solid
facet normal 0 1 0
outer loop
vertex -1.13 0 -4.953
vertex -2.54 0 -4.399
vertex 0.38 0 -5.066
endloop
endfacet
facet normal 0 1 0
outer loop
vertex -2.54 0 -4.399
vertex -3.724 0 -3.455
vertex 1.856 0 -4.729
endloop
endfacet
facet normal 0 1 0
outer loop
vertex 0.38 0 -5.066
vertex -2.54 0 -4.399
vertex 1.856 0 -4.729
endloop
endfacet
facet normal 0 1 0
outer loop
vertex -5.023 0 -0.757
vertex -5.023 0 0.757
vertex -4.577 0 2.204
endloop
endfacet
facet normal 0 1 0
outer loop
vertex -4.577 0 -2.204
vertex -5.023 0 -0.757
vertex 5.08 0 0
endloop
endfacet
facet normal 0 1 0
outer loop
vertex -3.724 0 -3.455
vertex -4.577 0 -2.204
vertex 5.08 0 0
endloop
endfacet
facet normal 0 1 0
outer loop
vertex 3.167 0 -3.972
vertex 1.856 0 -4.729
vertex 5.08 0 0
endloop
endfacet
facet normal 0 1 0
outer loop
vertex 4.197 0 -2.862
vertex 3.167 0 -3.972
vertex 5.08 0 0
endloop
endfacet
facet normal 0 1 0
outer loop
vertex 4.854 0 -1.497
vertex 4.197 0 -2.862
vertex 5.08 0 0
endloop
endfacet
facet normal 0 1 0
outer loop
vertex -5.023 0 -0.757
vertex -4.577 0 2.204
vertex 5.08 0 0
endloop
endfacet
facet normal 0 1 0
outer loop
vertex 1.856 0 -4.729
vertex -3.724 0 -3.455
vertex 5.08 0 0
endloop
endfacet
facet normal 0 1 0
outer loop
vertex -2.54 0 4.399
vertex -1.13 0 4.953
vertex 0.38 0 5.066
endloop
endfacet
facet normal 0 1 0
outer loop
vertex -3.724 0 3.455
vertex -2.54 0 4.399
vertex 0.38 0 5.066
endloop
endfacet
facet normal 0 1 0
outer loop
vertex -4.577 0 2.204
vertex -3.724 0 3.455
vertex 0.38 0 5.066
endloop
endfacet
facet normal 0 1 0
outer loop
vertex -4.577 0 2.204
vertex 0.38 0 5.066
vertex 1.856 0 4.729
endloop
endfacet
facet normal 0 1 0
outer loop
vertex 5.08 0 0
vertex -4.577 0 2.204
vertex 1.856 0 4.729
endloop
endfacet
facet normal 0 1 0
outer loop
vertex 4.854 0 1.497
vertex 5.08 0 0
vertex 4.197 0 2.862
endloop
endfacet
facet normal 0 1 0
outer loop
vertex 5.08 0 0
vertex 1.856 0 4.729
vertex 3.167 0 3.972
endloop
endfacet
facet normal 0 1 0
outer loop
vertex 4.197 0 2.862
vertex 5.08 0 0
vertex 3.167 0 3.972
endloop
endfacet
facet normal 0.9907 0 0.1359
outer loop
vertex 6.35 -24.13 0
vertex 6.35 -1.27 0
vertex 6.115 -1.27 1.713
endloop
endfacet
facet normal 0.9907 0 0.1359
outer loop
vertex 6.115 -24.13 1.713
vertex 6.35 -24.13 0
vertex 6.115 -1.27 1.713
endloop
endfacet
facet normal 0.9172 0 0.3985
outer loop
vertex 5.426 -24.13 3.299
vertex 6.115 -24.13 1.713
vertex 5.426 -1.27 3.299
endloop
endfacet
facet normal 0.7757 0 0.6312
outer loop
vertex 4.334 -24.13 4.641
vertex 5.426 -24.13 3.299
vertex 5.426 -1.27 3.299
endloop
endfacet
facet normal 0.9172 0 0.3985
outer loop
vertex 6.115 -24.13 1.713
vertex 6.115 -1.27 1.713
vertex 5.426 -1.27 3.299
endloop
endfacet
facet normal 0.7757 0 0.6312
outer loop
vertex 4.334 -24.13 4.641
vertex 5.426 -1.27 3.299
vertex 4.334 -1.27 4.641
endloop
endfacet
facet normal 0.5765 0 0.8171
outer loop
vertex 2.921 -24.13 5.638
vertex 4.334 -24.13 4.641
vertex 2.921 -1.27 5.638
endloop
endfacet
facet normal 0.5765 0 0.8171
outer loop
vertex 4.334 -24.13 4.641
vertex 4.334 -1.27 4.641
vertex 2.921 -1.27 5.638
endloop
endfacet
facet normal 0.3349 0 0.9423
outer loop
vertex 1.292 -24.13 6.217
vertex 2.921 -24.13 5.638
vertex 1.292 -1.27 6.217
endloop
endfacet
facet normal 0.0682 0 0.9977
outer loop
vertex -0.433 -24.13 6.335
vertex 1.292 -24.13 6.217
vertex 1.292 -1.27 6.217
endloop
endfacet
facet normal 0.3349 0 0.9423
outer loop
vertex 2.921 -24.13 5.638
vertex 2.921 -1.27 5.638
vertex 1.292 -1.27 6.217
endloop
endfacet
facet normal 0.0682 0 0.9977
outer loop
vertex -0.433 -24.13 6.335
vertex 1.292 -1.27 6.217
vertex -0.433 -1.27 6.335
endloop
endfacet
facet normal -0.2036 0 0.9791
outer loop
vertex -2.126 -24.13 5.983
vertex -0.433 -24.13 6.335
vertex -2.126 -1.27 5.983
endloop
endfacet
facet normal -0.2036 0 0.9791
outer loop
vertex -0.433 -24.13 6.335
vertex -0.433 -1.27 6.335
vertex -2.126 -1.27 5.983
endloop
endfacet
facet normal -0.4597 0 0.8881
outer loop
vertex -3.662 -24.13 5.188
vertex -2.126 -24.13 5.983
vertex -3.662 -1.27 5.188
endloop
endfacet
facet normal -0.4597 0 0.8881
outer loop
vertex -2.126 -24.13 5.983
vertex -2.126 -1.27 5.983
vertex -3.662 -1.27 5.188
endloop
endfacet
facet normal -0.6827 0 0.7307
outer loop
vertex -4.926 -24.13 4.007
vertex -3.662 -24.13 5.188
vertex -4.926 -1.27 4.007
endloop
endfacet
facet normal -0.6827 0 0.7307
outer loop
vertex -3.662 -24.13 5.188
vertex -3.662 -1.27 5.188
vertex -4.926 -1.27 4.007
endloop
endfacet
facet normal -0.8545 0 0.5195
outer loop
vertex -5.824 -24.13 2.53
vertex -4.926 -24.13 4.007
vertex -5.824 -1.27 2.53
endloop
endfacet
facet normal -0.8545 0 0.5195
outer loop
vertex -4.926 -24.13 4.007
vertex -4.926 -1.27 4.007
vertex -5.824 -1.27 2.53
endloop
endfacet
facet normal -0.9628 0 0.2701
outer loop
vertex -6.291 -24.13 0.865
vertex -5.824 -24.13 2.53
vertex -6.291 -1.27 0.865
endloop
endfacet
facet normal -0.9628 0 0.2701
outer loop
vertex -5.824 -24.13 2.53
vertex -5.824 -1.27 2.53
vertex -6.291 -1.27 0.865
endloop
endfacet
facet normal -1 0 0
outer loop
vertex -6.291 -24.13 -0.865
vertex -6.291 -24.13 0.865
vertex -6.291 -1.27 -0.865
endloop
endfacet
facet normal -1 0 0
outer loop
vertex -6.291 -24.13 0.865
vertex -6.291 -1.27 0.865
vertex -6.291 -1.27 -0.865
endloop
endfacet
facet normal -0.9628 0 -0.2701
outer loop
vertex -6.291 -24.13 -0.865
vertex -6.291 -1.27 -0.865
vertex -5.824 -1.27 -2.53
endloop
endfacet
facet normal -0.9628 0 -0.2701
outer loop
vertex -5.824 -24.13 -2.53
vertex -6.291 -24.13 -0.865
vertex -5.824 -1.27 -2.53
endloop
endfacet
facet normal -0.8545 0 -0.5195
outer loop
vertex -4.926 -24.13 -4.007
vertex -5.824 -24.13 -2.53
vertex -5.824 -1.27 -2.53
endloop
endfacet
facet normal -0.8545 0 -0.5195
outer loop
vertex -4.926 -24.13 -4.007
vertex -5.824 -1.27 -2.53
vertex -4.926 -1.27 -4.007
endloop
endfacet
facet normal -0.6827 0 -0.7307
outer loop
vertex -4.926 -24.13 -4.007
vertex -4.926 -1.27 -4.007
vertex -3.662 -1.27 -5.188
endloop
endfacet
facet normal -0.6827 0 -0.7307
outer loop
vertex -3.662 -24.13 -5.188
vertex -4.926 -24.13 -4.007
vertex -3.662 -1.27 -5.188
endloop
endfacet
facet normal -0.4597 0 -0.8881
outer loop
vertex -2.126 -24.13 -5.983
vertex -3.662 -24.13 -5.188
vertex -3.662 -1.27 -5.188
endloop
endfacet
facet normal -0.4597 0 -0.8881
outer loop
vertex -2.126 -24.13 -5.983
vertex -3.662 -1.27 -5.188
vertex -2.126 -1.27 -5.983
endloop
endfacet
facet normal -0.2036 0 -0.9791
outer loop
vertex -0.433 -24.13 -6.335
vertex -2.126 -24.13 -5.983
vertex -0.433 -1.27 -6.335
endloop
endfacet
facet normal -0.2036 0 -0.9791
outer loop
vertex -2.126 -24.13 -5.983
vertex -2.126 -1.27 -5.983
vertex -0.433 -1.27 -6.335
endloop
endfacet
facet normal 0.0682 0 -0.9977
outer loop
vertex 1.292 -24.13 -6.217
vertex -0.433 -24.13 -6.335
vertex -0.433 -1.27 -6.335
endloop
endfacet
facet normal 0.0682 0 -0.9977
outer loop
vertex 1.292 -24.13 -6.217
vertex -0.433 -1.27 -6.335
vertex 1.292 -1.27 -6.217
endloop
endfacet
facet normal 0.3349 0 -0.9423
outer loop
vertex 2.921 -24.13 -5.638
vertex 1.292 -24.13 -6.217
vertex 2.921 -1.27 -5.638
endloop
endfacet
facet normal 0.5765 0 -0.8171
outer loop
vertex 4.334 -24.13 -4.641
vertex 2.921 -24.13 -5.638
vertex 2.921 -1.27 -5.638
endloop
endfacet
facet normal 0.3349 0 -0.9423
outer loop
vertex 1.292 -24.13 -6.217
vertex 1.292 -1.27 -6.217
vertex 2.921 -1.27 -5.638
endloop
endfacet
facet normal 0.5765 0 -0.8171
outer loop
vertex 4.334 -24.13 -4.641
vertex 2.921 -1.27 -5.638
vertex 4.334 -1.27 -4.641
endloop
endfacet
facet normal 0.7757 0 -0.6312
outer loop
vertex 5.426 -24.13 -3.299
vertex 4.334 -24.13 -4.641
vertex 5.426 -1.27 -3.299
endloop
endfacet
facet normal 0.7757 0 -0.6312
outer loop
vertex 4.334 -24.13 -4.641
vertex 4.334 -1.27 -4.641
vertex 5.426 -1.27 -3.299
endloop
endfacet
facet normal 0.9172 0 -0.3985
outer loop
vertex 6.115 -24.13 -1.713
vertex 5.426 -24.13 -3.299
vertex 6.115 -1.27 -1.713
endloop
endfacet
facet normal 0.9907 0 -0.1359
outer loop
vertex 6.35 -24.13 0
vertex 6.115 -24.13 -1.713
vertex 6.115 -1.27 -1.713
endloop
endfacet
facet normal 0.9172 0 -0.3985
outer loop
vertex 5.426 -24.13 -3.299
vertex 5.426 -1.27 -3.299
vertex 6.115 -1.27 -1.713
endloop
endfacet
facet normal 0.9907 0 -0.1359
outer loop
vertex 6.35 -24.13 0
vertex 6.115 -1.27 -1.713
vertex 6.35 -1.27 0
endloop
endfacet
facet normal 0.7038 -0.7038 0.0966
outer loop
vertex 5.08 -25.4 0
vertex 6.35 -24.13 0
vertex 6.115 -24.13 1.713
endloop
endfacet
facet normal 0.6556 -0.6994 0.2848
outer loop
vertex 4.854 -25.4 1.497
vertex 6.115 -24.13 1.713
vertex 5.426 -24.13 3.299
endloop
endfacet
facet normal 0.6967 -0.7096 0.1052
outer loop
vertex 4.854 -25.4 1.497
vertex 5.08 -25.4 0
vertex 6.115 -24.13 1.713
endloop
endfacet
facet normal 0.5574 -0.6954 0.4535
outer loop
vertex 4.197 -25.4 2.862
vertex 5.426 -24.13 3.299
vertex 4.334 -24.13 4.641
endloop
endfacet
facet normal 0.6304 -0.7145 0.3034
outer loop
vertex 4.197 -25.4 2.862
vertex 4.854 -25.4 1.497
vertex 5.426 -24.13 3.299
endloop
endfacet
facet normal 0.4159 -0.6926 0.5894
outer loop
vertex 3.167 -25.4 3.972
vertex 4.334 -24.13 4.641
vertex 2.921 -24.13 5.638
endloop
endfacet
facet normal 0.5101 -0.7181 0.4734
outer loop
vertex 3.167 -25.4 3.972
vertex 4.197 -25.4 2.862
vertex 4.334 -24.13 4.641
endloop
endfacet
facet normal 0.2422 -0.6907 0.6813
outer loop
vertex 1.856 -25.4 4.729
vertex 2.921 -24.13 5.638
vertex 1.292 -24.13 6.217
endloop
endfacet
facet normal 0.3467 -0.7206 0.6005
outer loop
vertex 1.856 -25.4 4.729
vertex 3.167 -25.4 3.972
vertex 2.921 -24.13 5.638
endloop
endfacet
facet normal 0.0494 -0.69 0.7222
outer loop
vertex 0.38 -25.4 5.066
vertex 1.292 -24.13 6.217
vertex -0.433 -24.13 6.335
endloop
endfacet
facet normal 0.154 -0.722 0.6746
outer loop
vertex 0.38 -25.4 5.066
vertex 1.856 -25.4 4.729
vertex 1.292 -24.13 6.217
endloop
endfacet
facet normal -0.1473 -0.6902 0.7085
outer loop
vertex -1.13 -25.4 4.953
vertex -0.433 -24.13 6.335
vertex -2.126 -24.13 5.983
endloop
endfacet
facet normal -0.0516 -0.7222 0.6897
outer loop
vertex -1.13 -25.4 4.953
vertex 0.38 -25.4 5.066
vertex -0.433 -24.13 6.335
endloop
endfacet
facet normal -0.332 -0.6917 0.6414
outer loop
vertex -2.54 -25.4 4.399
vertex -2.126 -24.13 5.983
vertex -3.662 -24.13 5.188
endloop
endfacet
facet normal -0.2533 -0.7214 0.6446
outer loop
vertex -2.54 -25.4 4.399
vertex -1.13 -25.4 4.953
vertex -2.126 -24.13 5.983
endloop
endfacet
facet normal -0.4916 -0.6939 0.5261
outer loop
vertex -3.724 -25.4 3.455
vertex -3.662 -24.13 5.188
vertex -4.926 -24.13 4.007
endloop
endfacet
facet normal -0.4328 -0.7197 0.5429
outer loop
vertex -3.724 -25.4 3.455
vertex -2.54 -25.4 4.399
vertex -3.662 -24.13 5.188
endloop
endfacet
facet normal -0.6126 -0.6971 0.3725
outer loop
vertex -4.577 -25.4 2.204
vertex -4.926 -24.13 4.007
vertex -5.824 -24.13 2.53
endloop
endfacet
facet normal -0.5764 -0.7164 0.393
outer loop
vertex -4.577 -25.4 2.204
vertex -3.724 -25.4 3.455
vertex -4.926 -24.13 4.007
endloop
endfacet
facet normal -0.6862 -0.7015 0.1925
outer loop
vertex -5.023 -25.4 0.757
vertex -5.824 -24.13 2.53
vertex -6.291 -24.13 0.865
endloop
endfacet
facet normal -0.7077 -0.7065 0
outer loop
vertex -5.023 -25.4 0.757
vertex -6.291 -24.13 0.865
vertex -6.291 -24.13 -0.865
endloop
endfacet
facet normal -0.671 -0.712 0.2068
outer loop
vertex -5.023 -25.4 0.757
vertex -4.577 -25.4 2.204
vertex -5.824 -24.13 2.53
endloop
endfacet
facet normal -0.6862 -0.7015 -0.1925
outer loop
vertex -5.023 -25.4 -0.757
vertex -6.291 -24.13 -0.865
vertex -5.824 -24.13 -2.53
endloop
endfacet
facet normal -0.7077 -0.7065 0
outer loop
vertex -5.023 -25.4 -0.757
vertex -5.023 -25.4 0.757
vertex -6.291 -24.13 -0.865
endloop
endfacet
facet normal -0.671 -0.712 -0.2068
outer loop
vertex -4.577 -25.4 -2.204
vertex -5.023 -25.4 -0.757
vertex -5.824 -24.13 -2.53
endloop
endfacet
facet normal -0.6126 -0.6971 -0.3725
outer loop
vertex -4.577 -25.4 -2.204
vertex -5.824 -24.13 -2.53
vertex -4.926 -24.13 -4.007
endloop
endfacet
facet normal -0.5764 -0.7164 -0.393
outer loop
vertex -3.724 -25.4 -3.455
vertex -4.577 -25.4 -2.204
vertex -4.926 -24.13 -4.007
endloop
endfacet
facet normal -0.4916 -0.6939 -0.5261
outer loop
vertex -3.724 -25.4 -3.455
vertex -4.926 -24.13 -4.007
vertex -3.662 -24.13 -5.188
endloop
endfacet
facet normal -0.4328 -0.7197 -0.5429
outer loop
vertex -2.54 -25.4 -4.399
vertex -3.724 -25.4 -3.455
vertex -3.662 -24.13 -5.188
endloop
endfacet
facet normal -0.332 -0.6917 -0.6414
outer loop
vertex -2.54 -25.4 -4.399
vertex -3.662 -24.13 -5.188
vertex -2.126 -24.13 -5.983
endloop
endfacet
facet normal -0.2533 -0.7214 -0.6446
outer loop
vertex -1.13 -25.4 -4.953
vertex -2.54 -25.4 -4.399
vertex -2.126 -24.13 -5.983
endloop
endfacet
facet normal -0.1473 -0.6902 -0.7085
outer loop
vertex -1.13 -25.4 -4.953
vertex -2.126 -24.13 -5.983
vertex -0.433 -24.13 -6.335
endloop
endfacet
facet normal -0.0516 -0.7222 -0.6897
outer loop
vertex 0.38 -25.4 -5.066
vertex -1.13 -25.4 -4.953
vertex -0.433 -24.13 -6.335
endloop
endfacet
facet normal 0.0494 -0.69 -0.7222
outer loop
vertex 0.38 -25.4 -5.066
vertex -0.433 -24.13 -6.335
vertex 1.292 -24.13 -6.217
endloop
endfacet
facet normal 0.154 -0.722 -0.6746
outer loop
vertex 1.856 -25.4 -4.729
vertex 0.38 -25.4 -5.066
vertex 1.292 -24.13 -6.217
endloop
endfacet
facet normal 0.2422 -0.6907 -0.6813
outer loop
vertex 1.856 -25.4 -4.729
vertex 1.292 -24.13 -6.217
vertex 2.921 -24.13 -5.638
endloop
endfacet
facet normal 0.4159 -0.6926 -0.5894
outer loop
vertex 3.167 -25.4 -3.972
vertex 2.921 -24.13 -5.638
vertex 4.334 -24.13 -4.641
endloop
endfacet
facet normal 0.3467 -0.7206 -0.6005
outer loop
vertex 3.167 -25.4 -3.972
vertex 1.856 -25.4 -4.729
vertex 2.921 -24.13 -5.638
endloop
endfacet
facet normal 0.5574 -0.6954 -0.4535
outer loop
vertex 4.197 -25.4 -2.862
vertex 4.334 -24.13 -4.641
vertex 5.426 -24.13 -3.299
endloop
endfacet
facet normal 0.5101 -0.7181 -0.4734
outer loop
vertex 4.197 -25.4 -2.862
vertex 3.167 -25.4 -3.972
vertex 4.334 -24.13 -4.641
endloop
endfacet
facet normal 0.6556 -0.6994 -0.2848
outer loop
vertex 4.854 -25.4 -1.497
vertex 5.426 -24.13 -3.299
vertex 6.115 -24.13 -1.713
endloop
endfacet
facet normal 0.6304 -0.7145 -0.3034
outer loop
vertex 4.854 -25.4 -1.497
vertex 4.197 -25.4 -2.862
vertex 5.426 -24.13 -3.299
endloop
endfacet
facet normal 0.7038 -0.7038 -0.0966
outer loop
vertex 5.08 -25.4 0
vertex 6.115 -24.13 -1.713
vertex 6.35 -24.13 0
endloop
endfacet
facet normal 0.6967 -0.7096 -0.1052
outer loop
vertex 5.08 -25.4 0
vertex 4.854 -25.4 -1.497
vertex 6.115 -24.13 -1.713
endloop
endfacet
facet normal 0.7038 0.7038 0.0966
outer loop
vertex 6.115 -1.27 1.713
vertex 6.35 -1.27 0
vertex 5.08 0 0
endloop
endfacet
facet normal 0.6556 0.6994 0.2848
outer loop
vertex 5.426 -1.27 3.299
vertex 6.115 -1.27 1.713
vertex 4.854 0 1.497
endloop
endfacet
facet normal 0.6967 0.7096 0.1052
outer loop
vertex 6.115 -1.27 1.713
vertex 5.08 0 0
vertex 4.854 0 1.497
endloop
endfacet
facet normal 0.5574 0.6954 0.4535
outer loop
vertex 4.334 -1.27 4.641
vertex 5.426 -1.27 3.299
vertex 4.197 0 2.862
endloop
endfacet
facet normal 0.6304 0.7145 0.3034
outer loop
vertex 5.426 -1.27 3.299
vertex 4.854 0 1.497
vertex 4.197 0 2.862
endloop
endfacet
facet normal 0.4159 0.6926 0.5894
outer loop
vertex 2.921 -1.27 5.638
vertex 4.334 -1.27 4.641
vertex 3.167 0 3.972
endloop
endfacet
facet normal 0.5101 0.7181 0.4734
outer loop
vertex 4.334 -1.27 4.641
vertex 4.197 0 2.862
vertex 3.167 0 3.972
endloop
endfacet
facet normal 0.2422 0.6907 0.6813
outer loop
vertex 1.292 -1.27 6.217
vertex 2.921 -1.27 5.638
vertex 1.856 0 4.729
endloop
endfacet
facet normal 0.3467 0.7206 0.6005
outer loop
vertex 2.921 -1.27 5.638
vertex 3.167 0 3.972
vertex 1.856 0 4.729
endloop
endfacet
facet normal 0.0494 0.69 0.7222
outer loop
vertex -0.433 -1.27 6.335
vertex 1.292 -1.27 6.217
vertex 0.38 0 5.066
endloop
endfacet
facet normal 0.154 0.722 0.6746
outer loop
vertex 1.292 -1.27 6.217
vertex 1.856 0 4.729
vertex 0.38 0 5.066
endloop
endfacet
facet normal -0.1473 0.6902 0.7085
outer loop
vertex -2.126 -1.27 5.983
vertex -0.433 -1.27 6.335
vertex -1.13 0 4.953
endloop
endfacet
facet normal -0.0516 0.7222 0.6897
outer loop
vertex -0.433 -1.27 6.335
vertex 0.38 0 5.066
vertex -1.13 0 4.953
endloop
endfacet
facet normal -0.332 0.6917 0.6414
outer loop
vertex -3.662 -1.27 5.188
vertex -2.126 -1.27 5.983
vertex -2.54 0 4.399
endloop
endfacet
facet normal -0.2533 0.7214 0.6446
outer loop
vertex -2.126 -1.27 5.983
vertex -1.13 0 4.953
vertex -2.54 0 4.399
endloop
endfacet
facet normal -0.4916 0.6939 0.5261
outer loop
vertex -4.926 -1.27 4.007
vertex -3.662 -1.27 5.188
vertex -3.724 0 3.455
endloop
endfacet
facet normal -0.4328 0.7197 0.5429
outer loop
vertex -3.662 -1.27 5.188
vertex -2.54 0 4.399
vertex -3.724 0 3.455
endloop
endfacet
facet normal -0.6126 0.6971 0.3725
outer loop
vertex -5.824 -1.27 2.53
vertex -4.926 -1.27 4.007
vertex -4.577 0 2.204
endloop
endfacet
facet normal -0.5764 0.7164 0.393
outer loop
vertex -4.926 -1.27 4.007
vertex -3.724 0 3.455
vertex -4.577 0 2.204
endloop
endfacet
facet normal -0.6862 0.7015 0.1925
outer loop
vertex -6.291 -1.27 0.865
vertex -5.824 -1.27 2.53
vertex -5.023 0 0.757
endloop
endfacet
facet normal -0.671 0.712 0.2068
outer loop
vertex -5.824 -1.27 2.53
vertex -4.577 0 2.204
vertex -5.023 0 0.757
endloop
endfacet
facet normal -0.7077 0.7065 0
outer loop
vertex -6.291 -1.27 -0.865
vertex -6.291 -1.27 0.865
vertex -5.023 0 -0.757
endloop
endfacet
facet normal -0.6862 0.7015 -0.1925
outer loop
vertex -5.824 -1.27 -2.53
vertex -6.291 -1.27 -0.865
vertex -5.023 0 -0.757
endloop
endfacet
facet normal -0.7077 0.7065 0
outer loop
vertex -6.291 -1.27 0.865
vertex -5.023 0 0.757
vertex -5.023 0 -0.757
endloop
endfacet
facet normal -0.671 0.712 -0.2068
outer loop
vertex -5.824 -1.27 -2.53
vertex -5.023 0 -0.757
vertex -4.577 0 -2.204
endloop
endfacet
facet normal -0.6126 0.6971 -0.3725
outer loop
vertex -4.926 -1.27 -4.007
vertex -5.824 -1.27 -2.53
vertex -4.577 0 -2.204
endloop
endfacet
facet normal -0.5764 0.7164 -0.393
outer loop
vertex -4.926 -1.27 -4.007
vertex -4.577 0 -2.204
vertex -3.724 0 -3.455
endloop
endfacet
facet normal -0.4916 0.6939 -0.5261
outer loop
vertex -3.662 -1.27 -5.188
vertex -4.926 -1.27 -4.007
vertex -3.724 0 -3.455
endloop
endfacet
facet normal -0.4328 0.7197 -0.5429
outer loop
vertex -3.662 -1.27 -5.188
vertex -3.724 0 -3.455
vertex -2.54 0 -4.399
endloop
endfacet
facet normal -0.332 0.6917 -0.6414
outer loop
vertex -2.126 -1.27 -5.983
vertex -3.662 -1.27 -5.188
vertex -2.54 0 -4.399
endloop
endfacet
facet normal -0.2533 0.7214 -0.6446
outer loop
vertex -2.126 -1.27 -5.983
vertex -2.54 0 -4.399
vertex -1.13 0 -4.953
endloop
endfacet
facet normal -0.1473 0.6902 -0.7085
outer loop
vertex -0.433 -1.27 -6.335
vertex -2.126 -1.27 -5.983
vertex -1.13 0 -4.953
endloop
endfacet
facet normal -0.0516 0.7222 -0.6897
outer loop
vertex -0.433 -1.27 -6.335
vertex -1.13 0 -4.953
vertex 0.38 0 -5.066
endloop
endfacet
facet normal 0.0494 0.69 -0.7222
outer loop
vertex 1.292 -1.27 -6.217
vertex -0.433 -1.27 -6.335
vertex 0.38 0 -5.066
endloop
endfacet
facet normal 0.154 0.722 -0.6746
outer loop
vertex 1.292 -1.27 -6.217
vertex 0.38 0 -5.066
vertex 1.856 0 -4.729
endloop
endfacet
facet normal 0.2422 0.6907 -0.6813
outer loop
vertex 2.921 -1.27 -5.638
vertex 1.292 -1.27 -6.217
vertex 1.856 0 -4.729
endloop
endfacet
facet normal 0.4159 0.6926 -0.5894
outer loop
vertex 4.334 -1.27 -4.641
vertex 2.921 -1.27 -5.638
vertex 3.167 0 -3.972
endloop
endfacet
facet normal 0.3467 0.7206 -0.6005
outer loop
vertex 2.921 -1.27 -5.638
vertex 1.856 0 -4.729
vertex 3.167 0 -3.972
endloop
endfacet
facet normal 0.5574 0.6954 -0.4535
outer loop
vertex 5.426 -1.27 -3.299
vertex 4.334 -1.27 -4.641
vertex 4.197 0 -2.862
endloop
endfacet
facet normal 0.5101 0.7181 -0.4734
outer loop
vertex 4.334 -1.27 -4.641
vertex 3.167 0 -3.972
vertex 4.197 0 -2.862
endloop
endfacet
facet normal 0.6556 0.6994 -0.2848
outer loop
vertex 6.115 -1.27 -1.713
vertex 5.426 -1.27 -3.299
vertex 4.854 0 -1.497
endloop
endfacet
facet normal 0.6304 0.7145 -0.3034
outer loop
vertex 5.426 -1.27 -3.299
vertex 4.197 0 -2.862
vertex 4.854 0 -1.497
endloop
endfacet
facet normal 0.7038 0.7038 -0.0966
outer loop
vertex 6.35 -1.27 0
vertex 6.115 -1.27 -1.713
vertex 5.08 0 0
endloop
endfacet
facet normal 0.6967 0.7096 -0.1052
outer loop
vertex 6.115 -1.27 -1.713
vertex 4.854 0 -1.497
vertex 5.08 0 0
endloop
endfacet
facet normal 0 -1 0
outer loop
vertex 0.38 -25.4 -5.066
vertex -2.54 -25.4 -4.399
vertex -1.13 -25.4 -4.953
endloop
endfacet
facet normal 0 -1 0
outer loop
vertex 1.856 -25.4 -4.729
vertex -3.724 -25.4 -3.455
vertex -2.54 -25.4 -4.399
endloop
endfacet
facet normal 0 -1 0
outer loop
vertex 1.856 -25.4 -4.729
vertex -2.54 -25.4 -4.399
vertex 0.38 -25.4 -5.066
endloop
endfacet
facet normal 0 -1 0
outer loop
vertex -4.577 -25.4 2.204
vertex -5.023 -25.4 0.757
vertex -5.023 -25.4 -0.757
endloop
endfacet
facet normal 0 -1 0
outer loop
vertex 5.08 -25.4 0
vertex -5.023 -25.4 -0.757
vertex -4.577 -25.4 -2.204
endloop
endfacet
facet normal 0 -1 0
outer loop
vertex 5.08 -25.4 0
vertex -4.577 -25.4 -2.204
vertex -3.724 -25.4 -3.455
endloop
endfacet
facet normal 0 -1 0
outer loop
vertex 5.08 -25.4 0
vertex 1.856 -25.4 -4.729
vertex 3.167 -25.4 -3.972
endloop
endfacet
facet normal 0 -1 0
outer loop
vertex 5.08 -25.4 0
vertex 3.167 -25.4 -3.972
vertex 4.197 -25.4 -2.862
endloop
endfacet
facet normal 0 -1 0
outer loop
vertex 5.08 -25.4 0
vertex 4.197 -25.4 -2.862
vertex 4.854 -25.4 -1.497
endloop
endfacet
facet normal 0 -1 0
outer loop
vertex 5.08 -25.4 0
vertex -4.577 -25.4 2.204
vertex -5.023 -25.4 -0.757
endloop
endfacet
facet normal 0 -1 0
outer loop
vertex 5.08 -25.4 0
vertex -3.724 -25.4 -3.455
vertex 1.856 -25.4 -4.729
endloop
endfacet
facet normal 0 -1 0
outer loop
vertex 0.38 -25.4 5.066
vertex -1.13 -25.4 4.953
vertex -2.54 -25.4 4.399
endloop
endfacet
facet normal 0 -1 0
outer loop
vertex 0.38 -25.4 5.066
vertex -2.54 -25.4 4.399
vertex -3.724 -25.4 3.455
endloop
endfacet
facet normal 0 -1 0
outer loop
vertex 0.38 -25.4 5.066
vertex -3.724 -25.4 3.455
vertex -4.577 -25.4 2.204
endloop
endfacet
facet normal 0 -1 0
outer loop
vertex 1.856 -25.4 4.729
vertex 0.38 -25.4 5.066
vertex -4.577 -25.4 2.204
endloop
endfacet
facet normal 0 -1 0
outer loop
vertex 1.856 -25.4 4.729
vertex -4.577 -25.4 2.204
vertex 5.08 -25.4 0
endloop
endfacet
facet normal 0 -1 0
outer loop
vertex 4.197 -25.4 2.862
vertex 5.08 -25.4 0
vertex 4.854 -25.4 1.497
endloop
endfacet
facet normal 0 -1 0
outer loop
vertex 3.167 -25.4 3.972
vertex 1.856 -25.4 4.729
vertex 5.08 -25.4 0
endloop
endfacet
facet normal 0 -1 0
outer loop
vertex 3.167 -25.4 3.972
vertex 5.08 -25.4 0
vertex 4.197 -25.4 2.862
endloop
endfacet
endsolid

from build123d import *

# Parameters (mm, degrees)
F0_R     = 6.35
F1_DEPTH = 25.4
F2_SIZE  = 1.27
F3_SIZE  = 1.27


with BuildPart() as f1:
    # F0 (on Front) → F1 (new body)
    with BuildSketch(Plane.XZ):
        Circle(F0_R)
    extrude(amount=F1_DEPTH)

    # F2
    f2_edges = [f1.edges().sort_by_distance(p)[0] for p in [
        (-6.35, -25.4, 0),
    ]]
    chamfer(f2_edges, length=F2_SIZE)

    # F3
    f3_edges = [f1.edges().sort_by_distance(p)[0] for p in [
        (-6.35, 0, 0),
    ]]
    chamfer(f3_edges, length=F3_SIZE)


solid = f1.part
